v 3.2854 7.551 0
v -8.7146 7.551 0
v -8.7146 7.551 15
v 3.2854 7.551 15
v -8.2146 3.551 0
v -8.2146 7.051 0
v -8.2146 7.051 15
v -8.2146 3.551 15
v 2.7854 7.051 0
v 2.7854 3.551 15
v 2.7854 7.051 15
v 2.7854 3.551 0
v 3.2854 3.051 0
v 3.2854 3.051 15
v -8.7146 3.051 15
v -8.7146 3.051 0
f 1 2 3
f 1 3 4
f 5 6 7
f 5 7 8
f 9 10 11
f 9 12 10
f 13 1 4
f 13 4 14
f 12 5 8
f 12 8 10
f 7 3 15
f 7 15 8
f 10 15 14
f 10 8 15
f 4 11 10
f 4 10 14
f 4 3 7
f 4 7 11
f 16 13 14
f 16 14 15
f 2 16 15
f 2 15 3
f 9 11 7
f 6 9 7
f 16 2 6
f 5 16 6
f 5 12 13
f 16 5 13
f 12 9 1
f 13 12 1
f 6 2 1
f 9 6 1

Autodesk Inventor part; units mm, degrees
ref_plane "YZ Plane" through (0, 0, 0) normal (1, 0, 0) x (0, 1, 0)
ref_plane "XZ Plane" through (0, 0, 0) normal (0, 1, 0) x (-1, 0, 0)
ref_plane "XY Plane" through (0, 0, 0) normal (0, 0, 1) x (1, 0, 0)
sketch "Sketch1" plane through (0, 0, 0) normal (0, 0, 1) x (1, 0, 0)
  line L0 (-8.7146, 7.551) -> (3.2854, 7.551)
  line L1 (3.2854, 7.551) -> (3.2854, 3.051)
  line L2 (3.2854, 3.051) -> (-8.7146, 3.051)
  line L3 (-8.7146, 3.051) -> (-8.7146, 7.551)
  line L4 (2.7854, 7.051) -> (-8.2146, 7.051)
  line L5 (-8.2146, 7.051) -> (-8.2146, 3.551)
  line L6 (-8.2146, 3.551) -> (2.7854, 3.551)
  line L7 (2.7854, 3.551) -> (2.7854, 7.051)
  point P0 (0, 0)
  dimension "d0" = 12
  dimension "d1" = 4.5
  dimension "d2" = 0.5
extrude "Extrusion1" add sketch "Sketch1" along normal blind 15
properties part number "capa" material "Steel, Alloy"
